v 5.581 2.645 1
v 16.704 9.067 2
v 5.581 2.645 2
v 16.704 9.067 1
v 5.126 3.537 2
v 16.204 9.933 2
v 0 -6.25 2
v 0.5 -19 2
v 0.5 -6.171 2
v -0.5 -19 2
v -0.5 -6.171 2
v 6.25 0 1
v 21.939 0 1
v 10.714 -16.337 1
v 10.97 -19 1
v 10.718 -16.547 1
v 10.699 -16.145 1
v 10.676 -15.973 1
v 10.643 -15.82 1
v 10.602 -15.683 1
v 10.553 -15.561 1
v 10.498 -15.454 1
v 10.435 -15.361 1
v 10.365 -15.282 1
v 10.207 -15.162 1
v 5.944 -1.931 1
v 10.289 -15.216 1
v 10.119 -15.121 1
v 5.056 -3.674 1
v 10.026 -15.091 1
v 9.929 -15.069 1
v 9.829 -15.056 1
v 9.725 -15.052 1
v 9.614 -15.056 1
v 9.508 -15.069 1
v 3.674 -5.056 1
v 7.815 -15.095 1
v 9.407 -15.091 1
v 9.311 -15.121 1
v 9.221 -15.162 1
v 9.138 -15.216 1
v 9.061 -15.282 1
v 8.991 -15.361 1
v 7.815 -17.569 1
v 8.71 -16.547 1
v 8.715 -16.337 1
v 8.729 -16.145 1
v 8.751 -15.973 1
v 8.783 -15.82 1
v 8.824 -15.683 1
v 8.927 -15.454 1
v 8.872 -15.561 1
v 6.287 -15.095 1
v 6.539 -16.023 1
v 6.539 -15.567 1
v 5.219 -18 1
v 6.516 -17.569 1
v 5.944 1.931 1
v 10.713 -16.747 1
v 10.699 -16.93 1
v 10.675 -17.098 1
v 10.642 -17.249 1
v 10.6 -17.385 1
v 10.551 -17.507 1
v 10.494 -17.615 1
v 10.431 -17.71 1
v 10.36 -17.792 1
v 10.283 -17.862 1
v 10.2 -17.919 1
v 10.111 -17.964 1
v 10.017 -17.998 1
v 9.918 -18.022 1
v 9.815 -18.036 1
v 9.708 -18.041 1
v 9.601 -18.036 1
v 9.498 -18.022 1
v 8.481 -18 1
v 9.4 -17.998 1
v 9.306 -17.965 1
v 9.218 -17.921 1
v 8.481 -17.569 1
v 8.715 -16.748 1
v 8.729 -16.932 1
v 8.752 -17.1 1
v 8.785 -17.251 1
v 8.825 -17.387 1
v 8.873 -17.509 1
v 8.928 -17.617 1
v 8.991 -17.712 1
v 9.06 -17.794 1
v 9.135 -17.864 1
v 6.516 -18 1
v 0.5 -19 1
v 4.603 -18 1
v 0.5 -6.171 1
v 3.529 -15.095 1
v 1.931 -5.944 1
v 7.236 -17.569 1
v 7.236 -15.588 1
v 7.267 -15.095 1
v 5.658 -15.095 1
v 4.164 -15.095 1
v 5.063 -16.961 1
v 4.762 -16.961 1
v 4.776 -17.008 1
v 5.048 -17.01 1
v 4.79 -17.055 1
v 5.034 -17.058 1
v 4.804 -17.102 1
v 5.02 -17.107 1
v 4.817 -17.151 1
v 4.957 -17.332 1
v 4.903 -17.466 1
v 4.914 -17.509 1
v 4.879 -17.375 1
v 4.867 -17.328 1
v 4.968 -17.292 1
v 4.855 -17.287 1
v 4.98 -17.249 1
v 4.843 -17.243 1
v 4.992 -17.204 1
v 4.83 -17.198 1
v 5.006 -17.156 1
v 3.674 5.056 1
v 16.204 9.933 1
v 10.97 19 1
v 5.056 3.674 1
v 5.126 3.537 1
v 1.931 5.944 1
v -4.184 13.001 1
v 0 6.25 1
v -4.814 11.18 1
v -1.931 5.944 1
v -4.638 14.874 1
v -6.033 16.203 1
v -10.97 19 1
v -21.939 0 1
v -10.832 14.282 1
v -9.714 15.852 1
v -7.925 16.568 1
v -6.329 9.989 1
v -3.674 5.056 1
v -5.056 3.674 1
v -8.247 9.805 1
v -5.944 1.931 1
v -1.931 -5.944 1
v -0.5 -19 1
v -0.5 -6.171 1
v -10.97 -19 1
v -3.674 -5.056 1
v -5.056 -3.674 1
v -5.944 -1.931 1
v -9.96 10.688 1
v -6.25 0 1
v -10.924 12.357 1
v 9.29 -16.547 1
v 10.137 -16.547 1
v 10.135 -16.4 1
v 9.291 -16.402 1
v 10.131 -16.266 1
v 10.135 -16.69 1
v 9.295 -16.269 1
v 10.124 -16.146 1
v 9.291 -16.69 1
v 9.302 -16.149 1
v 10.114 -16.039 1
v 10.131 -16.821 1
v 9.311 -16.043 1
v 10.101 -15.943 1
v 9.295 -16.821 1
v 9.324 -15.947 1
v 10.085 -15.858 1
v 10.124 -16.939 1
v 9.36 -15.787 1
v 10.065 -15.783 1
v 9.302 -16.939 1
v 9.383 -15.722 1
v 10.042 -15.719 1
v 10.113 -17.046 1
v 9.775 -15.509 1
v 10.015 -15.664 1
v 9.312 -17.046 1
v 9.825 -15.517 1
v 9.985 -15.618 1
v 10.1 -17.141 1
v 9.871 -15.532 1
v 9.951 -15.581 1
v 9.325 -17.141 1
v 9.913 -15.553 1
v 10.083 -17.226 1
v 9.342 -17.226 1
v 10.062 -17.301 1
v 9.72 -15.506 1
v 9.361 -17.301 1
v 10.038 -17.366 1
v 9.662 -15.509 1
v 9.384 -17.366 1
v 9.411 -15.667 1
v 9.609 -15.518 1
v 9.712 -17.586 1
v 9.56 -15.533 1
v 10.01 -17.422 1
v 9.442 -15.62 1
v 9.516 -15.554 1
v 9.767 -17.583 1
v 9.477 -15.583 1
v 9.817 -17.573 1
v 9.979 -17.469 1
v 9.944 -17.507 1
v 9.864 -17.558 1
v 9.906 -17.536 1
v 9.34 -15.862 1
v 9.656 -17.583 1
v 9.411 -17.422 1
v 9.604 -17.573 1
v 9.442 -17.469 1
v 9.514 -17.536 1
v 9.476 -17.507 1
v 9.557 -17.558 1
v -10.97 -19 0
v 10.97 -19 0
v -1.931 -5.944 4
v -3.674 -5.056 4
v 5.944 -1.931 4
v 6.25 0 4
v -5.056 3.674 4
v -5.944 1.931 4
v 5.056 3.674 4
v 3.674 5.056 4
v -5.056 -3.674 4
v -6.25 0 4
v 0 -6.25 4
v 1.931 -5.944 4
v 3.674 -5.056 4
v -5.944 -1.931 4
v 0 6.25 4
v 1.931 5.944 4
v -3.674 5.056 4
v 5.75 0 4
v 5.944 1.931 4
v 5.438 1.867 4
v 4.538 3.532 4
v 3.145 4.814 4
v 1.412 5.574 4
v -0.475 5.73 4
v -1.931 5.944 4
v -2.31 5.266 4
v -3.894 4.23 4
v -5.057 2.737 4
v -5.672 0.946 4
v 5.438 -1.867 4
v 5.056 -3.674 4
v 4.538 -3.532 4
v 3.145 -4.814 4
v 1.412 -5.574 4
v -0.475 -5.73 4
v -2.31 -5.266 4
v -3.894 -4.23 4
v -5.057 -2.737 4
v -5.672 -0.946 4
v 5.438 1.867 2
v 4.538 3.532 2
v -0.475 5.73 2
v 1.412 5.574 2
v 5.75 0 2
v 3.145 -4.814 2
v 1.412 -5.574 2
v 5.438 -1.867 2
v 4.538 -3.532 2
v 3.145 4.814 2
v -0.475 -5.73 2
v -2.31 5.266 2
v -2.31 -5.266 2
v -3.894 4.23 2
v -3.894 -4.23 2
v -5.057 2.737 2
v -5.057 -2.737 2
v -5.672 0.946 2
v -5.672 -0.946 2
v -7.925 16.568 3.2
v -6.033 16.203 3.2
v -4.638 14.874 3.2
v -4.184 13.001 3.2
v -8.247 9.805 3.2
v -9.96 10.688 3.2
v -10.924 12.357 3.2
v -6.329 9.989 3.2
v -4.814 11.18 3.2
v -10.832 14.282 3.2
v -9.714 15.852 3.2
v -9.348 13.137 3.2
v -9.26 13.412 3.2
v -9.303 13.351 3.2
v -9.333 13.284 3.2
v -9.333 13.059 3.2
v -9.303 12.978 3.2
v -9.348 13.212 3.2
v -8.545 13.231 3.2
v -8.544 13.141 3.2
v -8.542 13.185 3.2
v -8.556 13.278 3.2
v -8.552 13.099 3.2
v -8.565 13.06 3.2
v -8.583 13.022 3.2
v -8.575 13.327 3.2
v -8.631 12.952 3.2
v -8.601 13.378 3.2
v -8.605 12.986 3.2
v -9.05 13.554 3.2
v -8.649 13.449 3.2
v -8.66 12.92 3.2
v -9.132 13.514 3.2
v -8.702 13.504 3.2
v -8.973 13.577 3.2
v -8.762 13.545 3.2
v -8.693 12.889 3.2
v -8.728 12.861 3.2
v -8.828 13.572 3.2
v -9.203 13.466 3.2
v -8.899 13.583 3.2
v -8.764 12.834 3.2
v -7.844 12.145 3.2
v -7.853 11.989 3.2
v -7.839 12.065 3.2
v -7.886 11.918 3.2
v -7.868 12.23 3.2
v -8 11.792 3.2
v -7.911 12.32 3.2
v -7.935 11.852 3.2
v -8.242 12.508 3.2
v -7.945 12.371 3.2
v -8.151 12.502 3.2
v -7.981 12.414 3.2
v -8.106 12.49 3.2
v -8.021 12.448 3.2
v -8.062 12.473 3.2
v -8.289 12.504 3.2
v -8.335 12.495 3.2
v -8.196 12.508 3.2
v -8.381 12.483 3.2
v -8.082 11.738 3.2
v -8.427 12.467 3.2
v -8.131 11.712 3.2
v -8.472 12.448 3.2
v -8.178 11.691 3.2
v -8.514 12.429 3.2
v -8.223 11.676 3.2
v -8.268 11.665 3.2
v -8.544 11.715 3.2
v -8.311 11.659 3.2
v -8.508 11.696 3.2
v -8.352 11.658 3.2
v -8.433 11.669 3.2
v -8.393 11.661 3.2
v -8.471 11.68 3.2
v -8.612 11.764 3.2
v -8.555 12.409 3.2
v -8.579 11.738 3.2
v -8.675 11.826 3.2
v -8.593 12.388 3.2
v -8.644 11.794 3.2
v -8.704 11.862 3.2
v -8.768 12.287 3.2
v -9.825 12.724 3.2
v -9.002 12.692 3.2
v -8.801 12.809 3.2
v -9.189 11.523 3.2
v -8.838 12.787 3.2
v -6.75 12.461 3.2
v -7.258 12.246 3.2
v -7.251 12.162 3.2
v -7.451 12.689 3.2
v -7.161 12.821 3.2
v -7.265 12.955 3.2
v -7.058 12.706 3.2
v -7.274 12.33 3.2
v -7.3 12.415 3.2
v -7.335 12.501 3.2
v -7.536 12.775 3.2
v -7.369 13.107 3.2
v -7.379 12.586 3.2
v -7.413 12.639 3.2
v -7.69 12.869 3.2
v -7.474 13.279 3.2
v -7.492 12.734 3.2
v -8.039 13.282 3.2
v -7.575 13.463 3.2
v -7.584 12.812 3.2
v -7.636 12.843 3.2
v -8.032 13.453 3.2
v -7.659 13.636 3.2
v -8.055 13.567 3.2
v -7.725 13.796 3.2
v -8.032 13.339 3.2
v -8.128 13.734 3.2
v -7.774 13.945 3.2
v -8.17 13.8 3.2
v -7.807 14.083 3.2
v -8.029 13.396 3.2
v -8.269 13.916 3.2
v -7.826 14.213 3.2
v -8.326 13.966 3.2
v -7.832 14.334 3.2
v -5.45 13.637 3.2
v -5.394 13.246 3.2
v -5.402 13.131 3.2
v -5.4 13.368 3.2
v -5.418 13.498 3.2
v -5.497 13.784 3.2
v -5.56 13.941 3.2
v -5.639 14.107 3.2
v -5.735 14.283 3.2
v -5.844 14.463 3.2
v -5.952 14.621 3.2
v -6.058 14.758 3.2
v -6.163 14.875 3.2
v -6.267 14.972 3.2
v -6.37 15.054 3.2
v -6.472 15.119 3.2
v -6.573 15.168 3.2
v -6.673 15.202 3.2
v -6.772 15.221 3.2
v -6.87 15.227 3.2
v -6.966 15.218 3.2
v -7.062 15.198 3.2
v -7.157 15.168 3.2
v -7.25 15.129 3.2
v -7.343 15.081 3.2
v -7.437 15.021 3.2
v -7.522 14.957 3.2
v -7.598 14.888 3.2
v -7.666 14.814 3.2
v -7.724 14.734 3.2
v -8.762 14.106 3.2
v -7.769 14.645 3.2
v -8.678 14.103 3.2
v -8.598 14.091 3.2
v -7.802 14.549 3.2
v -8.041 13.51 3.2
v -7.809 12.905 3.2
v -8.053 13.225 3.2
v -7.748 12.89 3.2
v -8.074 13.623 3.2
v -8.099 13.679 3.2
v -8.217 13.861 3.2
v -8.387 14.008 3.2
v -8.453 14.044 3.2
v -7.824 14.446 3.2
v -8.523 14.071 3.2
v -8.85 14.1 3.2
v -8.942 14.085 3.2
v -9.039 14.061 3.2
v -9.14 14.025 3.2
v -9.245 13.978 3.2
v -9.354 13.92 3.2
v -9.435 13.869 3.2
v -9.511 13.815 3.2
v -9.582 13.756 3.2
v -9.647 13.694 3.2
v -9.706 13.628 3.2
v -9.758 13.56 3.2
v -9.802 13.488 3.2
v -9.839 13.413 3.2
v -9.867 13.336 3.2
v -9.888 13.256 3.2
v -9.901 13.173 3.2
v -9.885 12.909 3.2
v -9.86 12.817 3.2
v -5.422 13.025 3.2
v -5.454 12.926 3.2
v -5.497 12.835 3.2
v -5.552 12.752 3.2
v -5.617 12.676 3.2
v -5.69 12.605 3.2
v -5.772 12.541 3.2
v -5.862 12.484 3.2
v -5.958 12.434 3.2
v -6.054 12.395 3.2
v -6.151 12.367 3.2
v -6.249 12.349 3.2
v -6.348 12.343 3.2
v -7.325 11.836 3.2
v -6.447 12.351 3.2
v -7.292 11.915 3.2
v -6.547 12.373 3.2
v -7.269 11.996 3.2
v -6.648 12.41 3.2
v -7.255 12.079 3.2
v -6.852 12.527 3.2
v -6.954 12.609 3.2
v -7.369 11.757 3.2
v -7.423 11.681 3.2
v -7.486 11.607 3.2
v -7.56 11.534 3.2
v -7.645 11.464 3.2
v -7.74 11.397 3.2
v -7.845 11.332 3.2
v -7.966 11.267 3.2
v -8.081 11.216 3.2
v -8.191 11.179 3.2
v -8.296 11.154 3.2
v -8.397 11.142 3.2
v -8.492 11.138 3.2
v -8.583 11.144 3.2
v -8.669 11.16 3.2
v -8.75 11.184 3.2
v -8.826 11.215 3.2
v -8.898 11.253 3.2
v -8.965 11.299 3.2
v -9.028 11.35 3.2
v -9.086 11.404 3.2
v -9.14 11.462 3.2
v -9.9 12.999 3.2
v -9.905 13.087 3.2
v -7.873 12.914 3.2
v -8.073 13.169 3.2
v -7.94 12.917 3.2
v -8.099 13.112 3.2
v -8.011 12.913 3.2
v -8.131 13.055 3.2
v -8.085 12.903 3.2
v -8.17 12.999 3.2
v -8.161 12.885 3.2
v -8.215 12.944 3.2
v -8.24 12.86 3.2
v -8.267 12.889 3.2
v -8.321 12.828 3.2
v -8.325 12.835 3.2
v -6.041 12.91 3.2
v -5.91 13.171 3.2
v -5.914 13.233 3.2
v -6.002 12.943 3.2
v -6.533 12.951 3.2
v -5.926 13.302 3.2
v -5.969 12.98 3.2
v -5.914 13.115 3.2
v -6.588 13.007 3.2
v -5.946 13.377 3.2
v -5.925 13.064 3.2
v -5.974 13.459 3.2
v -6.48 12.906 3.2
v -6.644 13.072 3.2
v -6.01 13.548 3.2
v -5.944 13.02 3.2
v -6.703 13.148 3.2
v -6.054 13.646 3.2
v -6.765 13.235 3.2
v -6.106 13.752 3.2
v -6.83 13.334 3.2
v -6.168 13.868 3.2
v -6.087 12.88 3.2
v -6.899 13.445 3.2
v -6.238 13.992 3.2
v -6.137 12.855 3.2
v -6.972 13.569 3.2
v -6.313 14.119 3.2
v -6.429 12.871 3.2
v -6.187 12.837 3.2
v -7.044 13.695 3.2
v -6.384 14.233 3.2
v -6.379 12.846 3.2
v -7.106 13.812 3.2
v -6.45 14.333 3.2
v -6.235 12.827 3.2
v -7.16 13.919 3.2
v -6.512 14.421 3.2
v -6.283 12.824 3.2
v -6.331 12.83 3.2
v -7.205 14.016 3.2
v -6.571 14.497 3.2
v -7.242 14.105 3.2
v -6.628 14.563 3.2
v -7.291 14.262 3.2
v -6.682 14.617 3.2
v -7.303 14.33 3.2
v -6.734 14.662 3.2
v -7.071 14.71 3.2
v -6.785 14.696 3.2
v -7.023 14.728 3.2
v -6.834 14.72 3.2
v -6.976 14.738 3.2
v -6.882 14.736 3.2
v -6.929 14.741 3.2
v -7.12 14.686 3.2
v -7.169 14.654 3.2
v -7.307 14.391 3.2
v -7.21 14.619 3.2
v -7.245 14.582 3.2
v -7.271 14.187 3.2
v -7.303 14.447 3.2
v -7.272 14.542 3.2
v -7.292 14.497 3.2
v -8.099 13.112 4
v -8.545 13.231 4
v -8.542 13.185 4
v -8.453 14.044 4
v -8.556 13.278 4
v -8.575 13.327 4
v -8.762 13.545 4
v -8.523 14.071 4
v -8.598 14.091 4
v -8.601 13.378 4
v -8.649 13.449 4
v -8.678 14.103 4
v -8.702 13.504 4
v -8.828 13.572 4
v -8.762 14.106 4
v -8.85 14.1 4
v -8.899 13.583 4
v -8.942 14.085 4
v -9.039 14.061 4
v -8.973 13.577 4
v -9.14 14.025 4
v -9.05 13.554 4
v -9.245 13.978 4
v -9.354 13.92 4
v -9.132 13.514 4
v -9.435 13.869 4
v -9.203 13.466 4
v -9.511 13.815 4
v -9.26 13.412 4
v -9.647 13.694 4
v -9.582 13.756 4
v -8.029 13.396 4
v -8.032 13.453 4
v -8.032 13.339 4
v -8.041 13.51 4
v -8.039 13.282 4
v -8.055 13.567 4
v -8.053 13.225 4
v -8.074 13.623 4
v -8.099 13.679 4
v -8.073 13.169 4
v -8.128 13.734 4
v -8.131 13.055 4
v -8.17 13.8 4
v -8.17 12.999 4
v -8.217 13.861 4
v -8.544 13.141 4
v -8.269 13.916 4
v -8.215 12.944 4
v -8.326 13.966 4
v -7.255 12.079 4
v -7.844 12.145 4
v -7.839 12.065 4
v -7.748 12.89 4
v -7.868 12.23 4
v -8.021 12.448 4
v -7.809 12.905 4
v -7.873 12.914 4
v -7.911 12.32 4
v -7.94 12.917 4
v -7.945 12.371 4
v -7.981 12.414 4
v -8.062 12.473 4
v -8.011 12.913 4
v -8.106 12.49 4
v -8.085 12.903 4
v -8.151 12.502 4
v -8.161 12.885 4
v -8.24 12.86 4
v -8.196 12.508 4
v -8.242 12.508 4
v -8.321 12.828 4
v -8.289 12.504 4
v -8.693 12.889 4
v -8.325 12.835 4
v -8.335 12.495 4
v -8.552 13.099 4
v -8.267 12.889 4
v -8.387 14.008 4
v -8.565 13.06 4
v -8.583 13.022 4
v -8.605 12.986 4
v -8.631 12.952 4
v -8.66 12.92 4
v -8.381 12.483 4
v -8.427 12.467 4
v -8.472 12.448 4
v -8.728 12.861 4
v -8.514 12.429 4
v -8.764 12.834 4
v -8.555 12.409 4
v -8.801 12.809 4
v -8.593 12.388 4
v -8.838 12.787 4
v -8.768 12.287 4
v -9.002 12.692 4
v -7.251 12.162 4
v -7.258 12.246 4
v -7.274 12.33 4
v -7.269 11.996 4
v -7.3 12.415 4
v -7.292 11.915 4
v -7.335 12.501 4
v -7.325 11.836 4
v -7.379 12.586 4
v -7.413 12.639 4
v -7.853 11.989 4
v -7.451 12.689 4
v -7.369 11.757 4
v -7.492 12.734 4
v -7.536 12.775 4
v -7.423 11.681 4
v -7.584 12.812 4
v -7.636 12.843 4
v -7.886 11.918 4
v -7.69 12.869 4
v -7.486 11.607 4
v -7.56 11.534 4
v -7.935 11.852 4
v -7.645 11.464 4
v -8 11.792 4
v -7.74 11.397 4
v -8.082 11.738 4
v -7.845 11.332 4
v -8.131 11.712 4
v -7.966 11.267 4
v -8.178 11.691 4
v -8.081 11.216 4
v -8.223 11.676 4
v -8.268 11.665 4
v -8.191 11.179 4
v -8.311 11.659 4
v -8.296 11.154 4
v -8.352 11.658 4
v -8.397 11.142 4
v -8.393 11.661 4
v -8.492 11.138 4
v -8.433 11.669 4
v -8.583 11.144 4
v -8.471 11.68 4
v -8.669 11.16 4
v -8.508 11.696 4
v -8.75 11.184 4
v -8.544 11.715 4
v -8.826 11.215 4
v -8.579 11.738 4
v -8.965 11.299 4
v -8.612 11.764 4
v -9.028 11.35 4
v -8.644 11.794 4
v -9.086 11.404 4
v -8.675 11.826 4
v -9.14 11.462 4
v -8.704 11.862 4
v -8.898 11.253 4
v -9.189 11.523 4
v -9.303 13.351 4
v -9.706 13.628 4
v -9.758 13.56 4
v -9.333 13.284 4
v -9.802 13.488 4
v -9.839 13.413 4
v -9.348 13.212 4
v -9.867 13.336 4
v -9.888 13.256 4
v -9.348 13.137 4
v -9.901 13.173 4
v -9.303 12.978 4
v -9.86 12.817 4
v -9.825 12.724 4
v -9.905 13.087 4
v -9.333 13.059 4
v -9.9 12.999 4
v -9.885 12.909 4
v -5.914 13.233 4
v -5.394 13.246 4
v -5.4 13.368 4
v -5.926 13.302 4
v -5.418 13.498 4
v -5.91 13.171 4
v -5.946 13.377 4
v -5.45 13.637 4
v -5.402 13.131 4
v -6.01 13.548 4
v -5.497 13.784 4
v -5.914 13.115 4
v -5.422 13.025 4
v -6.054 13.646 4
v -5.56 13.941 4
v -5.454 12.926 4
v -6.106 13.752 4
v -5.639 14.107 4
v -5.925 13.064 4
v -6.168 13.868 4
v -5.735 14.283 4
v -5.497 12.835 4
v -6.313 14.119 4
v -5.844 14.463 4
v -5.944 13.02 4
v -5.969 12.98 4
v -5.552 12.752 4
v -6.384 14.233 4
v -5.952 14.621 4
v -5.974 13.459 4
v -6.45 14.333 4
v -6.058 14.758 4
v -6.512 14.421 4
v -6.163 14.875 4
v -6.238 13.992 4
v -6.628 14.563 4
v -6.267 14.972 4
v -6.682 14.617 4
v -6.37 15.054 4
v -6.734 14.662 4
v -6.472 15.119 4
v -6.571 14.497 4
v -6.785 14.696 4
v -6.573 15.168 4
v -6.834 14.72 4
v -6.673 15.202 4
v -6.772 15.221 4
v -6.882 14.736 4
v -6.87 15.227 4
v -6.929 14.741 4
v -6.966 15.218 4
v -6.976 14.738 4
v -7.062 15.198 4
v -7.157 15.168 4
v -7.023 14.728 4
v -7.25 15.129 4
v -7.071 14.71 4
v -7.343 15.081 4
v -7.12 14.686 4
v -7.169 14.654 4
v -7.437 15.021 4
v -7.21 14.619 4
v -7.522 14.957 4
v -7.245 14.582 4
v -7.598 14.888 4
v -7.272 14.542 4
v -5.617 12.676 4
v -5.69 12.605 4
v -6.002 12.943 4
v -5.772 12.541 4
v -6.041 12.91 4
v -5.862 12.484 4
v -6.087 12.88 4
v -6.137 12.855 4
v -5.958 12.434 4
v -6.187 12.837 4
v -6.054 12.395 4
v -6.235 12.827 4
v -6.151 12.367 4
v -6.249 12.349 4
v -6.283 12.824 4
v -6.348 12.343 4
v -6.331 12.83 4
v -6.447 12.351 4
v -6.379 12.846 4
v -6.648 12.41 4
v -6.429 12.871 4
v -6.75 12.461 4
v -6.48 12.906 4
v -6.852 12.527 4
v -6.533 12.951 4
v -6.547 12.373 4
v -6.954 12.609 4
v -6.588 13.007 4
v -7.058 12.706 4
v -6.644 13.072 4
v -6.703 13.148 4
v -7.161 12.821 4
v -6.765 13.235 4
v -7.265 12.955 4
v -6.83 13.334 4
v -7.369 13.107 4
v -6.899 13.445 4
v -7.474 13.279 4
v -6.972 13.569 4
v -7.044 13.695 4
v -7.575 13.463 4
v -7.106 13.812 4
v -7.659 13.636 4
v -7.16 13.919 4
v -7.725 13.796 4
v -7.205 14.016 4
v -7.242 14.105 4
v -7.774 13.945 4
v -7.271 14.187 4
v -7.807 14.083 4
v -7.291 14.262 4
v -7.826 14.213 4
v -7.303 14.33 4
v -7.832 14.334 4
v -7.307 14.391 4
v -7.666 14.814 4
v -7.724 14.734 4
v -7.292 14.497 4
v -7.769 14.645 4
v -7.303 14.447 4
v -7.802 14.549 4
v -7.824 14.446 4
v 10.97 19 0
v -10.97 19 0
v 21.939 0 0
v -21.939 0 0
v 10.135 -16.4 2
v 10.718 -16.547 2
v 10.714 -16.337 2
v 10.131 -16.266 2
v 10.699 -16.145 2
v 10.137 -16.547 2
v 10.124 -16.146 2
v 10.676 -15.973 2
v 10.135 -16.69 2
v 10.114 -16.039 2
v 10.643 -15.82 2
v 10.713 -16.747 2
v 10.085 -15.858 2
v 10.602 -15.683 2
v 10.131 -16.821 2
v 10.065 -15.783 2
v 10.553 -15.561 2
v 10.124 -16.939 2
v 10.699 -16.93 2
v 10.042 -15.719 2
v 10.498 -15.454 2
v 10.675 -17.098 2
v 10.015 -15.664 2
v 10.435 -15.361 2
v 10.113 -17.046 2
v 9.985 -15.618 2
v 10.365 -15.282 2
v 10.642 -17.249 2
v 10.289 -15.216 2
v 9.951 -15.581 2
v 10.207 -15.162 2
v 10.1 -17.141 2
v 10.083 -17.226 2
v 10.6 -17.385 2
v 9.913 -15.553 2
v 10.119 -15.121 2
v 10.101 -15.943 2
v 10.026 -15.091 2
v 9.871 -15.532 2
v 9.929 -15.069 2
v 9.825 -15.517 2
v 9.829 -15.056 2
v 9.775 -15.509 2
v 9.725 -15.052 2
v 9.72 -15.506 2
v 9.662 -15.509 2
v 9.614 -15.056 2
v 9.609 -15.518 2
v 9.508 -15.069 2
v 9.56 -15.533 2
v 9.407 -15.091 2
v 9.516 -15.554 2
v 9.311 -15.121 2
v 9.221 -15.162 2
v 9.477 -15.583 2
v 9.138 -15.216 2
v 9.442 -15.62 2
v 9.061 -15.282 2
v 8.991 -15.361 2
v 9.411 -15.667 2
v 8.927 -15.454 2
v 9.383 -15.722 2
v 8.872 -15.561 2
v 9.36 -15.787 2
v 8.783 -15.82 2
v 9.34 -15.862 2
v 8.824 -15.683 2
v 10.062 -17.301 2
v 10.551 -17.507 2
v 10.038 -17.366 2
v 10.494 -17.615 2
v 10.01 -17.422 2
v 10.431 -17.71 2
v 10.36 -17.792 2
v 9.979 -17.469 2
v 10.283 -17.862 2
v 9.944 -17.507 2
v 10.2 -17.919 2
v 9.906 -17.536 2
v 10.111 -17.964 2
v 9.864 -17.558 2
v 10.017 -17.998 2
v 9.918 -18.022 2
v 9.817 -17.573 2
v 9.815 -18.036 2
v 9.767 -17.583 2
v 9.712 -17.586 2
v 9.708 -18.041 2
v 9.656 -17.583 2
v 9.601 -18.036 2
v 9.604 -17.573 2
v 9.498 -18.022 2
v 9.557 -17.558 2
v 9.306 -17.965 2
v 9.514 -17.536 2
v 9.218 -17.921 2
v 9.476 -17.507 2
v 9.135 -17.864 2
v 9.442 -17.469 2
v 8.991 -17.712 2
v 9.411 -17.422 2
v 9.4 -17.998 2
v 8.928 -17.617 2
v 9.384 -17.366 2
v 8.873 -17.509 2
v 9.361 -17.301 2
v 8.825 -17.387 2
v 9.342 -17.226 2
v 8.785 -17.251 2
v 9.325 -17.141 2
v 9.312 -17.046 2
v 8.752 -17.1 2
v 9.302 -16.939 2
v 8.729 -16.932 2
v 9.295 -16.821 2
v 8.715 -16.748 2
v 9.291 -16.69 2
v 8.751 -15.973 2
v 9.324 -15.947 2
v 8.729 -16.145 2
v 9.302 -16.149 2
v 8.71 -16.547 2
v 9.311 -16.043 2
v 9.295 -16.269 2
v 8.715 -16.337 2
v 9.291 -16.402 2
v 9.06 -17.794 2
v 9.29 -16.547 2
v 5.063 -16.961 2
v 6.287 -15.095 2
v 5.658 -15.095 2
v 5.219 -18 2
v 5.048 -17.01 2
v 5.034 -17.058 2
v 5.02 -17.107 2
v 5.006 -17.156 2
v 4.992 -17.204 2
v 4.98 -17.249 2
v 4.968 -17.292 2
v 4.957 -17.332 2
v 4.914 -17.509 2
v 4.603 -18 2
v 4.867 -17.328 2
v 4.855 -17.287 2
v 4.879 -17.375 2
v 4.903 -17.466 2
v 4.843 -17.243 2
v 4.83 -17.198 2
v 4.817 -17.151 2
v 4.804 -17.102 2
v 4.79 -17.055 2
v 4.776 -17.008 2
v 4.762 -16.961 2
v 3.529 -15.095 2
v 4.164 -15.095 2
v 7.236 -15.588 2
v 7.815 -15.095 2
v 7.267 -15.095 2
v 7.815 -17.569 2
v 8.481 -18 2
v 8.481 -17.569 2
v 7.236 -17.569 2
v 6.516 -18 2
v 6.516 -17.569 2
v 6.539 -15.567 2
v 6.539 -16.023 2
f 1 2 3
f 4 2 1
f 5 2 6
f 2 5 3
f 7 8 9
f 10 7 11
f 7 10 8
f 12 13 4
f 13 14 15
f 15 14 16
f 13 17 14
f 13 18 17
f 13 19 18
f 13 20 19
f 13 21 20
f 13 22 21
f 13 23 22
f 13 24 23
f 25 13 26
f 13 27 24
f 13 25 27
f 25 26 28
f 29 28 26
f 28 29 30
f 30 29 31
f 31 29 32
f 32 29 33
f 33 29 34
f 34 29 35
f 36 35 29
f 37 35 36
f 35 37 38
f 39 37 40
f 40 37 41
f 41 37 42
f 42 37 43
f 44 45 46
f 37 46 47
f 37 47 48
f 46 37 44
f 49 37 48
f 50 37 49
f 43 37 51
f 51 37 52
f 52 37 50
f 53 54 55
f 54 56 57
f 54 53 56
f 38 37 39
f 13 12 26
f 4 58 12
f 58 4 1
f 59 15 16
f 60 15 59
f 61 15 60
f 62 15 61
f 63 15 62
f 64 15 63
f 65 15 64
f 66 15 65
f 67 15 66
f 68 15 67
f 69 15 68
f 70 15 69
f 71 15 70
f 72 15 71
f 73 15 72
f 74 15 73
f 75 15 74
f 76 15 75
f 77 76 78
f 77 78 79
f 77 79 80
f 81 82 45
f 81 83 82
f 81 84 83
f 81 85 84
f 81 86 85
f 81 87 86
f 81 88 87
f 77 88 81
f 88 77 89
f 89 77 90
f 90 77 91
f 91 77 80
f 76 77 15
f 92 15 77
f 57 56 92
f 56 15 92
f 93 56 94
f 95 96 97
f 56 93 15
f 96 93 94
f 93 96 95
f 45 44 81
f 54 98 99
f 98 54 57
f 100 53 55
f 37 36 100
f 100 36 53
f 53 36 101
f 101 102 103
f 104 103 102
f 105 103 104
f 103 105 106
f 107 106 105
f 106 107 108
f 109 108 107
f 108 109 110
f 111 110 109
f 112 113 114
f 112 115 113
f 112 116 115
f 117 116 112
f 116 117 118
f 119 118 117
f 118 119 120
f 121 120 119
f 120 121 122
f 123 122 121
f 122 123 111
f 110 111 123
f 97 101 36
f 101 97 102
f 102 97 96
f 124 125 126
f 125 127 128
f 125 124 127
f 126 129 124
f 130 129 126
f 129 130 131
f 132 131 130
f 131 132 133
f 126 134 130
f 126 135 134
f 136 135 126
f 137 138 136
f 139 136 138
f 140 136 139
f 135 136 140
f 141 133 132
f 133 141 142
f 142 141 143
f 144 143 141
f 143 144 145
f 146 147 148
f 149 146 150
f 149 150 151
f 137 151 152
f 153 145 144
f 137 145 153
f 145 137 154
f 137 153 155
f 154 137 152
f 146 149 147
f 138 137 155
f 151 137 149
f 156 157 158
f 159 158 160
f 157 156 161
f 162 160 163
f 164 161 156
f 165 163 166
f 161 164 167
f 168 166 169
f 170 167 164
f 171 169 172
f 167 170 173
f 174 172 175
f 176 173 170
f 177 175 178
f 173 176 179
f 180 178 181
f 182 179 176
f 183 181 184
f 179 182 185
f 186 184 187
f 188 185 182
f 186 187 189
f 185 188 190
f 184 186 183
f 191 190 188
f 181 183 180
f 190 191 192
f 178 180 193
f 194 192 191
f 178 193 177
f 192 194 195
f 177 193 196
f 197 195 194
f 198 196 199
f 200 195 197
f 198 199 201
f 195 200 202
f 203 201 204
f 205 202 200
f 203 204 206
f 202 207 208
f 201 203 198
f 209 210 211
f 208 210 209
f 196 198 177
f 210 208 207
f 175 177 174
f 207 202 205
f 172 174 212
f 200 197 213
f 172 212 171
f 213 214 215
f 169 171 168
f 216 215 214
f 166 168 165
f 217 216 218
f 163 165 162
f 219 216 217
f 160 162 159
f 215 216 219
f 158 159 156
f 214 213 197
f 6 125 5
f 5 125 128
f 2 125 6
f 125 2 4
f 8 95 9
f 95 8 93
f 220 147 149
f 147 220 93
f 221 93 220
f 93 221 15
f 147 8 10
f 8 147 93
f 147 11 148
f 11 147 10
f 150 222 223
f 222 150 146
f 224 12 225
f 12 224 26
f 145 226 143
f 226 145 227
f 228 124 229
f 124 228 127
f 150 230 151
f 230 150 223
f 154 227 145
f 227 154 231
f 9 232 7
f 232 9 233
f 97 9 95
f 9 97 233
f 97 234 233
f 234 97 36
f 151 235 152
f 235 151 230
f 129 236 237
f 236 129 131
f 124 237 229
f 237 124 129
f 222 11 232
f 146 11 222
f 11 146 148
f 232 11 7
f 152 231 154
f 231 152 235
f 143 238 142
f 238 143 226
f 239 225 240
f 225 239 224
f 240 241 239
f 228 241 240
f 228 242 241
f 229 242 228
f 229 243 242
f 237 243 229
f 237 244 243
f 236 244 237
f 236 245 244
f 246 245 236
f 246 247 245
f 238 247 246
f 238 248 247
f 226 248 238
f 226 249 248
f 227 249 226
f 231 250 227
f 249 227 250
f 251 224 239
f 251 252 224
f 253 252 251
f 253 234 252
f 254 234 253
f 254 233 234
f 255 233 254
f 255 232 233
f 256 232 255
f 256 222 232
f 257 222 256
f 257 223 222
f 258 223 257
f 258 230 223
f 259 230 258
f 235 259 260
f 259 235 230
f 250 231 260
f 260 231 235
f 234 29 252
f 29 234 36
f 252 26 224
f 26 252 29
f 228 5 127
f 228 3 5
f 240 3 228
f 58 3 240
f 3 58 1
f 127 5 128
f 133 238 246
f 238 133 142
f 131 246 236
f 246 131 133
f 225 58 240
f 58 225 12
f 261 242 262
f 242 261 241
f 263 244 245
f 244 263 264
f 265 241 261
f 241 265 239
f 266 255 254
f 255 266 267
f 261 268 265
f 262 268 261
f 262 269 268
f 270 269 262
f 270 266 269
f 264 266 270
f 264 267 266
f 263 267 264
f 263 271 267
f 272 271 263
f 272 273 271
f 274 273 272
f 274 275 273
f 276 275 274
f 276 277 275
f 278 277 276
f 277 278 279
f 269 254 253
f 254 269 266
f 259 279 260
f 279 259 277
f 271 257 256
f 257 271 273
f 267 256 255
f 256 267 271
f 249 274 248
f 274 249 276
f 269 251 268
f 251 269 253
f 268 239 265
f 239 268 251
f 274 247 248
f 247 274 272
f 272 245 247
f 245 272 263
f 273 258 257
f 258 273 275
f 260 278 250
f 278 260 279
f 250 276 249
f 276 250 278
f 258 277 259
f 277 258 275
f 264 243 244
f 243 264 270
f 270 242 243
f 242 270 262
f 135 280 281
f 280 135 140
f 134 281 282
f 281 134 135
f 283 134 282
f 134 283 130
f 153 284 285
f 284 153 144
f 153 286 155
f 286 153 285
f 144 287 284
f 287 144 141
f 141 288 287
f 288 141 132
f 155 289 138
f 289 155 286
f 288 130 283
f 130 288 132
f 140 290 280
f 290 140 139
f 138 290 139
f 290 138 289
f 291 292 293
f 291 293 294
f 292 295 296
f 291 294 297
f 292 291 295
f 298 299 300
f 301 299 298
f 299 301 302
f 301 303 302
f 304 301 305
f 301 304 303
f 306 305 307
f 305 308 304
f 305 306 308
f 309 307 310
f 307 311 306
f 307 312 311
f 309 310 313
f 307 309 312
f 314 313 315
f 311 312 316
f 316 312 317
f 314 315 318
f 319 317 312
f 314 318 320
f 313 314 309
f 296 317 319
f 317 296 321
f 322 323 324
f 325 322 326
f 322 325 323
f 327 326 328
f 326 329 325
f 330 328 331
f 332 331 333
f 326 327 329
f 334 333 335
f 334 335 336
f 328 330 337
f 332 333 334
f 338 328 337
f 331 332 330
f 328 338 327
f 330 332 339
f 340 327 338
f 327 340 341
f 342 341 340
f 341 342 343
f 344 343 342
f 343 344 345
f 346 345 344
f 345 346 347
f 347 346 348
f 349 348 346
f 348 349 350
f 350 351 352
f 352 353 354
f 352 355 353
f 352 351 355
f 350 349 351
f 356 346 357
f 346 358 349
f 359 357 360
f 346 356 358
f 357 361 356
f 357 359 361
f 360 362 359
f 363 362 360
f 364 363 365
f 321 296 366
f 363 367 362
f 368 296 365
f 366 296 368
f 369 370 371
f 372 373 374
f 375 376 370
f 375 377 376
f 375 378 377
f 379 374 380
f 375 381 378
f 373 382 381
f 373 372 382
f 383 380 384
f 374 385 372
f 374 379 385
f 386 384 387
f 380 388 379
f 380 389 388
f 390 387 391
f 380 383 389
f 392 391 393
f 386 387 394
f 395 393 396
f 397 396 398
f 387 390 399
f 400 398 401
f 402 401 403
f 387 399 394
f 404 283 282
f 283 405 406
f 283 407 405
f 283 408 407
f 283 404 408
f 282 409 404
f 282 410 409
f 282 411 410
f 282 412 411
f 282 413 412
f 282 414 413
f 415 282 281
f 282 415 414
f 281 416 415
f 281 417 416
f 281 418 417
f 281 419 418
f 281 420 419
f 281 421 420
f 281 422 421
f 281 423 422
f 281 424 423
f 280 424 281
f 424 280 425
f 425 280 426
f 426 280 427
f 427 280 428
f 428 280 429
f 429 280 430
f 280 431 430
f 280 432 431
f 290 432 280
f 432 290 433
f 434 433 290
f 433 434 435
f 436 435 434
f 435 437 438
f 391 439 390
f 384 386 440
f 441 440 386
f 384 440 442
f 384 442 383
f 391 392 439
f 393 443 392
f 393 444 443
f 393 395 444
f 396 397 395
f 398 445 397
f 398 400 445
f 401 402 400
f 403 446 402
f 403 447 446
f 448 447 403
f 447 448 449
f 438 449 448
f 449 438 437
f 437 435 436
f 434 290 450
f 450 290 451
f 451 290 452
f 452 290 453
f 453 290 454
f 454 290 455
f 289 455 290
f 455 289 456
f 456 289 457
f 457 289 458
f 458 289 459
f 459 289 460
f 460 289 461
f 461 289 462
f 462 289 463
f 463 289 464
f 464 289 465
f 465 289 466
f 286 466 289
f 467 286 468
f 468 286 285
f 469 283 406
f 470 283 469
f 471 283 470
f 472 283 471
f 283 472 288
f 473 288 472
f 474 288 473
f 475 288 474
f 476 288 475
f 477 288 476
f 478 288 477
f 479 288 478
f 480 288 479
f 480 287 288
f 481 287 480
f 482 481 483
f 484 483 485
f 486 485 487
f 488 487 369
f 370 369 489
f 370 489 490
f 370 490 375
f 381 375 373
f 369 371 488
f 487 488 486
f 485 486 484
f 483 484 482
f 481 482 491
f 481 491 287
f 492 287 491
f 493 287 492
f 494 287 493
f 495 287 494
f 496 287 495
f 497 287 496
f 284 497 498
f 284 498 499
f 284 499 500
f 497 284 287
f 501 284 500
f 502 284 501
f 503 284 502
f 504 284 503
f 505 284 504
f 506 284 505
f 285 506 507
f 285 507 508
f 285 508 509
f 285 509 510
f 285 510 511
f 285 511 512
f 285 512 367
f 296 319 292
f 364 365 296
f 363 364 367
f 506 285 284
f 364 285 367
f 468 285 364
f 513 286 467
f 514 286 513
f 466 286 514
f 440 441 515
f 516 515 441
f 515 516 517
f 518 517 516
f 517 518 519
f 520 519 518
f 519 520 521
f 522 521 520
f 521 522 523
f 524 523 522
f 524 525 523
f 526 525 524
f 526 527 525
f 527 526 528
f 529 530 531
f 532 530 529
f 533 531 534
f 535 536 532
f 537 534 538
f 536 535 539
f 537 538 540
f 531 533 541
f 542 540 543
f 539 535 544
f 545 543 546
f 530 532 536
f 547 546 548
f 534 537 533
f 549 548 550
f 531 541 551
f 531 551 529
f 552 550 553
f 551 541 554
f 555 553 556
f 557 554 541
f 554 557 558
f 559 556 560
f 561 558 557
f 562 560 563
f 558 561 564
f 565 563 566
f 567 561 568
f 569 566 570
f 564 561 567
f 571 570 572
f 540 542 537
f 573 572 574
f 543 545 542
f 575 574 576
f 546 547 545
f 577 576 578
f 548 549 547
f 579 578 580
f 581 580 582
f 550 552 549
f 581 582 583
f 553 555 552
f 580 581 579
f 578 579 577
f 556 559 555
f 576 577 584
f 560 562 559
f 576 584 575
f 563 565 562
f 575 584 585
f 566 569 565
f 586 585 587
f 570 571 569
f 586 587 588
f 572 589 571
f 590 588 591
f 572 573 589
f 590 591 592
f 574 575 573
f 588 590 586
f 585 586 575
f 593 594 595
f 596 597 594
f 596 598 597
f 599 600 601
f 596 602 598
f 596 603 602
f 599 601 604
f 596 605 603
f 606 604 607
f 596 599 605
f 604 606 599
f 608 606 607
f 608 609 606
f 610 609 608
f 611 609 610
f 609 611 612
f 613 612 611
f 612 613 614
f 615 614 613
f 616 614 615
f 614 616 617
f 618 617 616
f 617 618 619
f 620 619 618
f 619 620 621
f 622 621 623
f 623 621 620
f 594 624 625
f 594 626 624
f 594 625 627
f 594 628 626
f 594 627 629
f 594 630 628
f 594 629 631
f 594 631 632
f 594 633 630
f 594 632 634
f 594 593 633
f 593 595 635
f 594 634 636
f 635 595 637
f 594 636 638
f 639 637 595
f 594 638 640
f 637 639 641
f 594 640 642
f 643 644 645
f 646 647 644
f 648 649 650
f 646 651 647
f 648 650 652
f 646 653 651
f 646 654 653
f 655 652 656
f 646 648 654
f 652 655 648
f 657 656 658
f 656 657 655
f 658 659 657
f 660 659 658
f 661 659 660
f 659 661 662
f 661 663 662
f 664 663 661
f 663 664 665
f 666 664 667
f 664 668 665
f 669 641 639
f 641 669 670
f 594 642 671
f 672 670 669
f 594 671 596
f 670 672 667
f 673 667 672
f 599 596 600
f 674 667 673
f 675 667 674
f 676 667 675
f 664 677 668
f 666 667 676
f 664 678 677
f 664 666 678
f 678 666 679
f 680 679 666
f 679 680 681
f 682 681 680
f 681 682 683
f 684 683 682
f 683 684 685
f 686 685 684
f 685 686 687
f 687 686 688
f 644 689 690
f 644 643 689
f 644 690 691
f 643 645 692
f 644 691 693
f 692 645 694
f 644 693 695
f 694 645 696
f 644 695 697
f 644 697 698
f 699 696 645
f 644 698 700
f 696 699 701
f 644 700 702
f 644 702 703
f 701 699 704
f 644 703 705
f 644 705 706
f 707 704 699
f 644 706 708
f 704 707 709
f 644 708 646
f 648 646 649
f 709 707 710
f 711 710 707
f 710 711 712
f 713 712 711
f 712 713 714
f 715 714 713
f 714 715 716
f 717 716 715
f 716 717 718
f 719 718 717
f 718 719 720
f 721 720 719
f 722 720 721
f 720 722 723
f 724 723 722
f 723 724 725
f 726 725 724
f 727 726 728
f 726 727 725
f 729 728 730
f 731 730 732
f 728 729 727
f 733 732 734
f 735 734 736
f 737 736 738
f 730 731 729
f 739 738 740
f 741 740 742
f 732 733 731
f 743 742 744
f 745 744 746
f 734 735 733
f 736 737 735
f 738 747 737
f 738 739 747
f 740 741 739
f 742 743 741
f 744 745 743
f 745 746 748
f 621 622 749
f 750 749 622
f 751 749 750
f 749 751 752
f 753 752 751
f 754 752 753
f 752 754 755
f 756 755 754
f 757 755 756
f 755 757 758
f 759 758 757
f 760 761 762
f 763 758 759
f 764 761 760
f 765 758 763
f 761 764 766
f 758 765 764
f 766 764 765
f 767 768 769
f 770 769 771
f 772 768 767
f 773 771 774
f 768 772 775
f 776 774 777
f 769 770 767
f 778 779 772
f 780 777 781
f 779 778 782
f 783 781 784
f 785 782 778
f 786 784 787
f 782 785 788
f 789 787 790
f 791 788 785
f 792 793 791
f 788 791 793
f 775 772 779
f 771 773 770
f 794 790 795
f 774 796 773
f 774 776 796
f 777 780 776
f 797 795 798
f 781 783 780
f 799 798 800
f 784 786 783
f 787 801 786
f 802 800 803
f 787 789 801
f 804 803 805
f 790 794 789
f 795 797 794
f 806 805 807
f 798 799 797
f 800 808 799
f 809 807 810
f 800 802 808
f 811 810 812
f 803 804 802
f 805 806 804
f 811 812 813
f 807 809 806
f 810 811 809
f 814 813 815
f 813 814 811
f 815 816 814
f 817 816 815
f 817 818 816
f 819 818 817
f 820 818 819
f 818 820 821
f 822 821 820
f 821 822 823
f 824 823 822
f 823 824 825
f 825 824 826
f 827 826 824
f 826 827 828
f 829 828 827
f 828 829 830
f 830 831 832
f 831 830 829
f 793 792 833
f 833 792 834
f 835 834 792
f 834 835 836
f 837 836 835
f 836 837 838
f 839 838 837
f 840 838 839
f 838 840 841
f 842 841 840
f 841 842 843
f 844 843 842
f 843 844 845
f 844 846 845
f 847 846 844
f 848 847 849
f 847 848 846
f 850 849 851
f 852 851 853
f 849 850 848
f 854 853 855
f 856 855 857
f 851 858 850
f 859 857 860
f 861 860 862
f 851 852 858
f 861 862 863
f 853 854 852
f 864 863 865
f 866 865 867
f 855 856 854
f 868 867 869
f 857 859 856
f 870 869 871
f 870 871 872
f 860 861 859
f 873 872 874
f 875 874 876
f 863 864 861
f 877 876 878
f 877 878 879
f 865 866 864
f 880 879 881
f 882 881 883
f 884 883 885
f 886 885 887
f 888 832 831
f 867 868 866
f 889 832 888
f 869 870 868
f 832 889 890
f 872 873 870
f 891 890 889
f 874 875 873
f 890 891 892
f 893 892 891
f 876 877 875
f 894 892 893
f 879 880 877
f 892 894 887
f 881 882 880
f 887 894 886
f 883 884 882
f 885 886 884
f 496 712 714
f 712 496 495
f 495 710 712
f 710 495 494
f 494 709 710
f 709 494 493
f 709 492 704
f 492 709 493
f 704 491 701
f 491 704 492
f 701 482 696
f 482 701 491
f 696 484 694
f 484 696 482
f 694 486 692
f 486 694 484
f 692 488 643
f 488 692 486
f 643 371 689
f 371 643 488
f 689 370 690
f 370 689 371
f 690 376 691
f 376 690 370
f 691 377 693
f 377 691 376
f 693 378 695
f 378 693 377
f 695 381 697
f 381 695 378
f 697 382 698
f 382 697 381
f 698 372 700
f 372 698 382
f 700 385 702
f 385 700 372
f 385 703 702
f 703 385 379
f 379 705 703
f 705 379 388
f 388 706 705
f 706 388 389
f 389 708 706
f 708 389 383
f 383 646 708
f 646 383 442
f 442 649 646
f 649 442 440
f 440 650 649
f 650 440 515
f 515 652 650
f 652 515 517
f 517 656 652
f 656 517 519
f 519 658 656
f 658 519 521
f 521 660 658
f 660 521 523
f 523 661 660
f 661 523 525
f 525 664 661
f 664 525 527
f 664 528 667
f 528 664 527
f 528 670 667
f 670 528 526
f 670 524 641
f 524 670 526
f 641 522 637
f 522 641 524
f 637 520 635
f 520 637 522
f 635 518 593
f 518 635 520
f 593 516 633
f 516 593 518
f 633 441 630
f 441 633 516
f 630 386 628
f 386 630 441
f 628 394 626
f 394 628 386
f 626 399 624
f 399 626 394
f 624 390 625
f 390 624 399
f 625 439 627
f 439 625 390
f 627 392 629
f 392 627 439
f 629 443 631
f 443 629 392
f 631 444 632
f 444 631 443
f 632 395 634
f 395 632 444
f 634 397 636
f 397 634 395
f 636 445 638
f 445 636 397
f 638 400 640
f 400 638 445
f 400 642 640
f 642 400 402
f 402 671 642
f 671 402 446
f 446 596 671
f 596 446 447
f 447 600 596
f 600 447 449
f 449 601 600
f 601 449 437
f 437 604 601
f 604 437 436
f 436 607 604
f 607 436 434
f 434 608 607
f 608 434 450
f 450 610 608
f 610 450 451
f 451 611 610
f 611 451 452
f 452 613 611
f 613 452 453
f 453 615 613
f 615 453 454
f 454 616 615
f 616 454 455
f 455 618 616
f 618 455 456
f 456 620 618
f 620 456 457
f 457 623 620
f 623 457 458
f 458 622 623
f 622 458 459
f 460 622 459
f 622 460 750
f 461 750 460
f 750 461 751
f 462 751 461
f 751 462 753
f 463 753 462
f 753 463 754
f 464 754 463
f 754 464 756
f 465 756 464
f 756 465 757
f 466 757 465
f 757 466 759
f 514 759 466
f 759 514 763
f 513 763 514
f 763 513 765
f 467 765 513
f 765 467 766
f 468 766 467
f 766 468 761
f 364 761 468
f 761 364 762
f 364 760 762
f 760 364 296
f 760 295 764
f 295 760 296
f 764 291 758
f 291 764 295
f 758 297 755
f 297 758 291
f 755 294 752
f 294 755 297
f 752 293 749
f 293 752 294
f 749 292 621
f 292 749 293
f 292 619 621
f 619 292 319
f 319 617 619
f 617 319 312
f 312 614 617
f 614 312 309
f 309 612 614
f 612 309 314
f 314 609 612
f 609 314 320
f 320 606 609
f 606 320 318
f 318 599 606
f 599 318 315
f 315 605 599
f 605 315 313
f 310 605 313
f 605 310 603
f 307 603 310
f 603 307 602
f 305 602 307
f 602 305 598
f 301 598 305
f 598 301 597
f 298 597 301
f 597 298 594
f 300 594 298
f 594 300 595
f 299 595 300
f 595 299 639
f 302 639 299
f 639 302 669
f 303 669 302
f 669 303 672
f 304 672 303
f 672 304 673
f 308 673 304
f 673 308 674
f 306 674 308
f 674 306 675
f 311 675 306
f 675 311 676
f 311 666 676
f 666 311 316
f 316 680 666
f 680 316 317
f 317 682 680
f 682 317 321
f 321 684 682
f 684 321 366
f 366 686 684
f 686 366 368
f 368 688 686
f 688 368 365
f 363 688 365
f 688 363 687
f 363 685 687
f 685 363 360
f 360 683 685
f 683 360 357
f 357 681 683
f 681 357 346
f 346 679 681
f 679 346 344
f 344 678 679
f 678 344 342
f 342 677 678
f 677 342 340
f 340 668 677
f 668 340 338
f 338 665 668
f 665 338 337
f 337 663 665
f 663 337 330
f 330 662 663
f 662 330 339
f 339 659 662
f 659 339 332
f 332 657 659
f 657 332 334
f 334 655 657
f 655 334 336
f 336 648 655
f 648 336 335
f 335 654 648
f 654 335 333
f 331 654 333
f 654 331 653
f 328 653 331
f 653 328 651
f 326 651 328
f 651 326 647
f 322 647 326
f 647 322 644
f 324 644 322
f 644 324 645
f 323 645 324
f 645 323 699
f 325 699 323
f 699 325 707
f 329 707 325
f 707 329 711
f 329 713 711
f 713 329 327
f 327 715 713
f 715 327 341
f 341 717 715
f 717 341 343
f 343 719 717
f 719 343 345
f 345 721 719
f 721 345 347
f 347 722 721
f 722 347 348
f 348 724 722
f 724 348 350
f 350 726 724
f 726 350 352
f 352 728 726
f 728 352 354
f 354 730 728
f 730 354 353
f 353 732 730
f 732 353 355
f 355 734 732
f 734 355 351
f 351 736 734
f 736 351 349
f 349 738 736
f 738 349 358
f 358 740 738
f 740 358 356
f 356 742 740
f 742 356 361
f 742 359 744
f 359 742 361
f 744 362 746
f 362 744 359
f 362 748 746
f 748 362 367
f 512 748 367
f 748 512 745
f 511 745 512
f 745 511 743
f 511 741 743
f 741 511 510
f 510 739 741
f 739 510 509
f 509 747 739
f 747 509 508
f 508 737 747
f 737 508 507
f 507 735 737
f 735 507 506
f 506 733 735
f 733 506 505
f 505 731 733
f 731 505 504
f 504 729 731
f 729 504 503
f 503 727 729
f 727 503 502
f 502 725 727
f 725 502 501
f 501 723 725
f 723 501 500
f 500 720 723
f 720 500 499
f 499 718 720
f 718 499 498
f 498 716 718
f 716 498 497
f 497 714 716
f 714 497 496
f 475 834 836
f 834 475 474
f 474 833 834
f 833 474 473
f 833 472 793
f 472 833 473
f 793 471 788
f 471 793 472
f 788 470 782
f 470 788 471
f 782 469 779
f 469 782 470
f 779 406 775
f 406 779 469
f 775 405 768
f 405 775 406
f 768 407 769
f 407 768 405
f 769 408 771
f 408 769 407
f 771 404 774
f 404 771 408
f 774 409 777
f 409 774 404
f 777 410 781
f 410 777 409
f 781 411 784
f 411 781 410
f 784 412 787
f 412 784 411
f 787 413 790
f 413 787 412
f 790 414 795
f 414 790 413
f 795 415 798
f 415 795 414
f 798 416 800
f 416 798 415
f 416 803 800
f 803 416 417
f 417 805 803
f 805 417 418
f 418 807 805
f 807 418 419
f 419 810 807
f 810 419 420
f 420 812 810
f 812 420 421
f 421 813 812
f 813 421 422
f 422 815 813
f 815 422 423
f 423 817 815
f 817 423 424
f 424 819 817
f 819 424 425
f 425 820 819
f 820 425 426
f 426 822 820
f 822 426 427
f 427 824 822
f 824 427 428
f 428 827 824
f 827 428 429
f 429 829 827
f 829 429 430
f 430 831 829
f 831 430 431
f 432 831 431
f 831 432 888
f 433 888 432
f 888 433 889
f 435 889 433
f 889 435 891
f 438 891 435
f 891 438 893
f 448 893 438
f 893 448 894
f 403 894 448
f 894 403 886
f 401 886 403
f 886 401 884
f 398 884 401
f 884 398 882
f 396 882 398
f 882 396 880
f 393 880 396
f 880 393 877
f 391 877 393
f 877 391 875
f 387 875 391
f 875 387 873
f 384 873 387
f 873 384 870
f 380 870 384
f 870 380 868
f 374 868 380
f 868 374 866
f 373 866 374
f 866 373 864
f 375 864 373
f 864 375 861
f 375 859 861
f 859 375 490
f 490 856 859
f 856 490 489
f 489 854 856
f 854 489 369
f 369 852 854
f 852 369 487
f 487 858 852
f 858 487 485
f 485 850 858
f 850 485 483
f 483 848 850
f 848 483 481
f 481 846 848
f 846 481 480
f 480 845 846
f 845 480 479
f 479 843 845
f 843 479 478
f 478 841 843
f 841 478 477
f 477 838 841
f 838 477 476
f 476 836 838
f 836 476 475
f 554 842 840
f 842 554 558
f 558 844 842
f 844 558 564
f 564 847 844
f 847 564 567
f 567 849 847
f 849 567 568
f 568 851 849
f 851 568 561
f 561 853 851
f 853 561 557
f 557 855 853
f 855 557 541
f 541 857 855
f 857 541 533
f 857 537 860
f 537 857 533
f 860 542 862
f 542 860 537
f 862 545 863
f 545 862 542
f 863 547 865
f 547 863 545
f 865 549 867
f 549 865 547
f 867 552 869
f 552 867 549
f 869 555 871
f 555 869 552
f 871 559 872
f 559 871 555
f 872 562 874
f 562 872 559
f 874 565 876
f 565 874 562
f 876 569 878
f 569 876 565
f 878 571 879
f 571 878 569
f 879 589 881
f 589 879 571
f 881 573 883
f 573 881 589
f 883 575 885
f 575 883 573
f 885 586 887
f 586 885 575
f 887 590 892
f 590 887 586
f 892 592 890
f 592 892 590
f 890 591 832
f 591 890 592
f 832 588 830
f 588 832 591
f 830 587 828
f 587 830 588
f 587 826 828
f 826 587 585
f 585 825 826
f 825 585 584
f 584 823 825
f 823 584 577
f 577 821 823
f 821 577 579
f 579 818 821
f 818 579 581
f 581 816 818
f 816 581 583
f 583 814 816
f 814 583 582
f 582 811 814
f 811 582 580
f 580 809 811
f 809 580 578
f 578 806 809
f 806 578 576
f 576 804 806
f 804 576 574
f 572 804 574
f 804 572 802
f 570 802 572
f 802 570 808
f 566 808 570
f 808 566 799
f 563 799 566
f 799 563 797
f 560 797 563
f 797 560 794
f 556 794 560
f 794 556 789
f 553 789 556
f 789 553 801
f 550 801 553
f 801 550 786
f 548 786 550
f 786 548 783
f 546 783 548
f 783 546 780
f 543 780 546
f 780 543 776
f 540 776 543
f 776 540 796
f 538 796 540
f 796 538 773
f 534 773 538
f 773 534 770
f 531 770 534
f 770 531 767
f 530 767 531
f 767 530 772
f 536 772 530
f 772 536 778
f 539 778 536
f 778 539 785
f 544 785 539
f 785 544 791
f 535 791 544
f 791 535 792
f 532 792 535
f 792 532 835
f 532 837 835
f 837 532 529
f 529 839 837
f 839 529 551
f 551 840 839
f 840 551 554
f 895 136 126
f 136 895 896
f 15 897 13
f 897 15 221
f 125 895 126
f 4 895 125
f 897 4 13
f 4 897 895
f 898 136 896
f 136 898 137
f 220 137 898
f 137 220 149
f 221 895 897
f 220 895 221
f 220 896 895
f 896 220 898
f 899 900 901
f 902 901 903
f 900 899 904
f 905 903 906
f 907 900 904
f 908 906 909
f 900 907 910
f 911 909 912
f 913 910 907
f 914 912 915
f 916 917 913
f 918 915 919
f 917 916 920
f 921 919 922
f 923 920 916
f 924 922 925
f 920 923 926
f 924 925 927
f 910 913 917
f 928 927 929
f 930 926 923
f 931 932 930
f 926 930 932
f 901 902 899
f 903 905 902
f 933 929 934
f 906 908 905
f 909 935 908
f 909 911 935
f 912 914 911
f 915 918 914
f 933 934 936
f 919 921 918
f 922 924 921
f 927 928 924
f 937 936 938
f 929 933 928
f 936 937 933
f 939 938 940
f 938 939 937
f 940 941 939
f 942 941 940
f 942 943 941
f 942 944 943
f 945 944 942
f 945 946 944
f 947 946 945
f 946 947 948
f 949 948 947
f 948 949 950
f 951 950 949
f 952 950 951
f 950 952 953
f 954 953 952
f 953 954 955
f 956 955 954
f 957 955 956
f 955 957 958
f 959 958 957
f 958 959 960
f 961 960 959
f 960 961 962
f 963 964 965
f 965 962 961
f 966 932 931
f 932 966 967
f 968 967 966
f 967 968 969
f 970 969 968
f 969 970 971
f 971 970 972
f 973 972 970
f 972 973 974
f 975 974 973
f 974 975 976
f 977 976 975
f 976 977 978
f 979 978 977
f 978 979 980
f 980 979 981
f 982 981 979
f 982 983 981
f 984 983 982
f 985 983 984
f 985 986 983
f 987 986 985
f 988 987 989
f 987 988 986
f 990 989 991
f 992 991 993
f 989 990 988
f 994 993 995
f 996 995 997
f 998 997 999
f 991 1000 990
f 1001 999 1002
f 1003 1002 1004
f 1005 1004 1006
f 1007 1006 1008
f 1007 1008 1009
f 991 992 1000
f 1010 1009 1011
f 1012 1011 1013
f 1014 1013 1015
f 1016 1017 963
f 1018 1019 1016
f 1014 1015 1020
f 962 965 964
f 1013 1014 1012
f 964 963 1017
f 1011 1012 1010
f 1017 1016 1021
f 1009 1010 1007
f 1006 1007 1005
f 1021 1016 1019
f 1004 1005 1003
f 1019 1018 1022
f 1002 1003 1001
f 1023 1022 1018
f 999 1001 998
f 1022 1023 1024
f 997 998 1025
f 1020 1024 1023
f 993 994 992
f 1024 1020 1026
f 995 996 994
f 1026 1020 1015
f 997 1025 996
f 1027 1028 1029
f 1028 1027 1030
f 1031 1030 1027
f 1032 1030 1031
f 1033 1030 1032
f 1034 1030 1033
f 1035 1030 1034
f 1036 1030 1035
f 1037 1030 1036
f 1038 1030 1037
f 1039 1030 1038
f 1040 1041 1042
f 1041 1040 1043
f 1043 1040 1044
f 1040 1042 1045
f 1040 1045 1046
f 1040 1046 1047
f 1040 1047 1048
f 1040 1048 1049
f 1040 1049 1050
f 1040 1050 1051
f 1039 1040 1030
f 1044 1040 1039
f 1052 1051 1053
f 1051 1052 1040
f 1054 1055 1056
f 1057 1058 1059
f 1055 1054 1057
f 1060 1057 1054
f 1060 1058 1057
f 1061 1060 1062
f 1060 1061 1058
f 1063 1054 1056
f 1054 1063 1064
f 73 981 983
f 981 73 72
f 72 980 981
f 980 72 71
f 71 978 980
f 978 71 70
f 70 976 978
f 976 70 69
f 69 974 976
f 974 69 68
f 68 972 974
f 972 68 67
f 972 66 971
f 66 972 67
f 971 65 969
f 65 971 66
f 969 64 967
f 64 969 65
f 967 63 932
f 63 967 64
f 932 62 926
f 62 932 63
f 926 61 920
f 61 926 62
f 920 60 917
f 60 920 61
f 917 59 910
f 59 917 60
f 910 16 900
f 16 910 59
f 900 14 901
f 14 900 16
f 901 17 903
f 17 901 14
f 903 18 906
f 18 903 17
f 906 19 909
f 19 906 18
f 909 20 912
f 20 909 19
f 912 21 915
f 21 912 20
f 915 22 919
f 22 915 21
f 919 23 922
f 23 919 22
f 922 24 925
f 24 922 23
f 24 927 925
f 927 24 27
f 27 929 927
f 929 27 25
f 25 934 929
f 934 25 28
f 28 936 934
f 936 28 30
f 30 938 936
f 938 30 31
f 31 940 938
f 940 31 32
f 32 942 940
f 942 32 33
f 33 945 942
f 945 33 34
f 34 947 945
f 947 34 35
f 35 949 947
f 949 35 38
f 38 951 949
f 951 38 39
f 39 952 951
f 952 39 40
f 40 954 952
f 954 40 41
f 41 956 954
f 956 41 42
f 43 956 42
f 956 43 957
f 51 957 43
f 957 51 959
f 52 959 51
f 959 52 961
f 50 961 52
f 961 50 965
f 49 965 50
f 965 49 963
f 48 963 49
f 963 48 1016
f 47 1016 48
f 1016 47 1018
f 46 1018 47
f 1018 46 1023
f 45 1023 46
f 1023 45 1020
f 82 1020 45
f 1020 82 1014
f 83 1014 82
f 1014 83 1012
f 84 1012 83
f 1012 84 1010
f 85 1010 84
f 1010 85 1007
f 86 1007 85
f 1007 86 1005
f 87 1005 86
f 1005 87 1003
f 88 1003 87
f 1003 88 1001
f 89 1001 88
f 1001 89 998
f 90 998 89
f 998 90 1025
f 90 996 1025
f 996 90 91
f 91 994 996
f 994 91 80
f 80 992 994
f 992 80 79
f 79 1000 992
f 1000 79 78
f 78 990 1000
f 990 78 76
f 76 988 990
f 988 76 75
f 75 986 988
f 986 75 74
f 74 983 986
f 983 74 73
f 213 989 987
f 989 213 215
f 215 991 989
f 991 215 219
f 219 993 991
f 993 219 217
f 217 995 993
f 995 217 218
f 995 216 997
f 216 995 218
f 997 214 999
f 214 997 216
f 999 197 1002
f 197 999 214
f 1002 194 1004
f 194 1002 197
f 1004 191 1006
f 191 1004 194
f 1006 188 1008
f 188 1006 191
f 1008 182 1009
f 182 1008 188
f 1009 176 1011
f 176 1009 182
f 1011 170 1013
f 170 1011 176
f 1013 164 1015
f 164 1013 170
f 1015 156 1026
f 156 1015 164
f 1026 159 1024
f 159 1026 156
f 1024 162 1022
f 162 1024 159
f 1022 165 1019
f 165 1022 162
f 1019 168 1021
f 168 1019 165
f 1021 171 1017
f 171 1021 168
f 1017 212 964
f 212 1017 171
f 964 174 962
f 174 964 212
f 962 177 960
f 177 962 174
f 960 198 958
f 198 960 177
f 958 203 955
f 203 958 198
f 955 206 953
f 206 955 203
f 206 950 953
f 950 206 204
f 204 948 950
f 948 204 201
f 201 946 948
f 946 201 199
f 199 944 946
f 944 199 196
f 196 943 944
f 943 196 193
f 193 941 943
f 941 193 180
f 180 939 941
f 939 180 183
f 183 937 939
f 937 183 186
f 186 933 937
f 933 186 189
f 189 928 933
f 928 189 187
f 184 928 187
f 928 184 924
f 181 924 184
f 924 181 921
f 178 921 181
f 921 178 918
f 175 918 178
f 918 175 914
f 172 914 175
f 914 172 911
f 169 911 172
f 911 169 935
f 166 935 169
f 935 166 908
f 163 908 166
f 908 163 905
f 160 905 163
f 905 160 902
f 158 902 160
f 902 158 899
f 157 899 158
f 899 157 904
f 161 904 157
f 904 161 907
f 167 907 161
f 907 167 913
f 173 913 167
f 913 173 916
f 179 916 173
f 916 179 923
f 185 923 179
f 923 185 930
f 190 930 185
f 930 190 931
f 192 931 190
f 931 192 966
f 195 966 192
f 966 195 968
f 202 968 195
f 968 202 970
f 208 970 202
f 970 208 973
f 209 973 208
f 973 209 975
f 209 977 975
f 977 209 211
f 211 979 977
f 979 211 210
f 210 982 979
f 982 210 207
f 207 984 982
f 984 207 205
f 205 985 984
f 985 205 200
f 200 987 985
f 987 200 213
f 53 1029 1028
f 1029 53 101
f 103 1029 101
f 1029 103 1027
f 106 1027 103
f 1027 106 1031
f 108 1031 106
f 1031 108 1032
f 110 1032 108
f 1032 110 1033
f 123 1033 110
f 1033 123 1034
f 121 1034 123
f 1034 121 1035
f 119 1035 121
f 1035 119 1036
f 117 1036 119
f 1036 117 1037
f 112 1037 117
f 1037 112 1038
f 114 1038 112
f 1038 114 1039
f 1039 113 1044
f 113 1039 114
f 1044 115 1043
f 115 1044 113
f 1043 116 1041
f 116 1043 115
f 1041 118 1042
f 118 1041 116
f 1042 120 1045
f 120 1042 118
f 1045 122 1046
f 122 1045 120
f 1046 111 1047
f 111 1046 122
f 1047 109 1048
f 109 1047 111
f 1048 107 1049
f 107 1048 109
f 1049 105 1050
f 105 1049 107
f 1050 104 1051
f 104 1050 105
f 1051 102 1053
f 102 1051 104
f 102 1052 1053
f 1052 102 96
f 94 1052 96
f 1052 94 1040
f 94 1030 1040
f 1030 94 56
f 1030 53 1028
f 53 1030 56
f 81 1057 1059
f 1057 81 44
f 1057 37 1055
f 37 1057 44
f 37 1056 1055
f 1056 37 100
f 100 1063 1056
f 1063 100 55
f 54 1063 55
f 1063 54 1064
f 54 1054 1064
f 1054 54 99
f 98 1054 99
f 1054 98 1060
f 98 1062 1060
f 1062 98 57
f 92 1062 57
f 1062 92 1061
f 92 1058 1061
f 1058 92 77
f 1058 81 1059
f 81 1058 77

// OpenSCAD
include <../../Scripts/18xx tiles basic functions.scad>
hex("green");
put_tilenr("V10");
single_city(v=[5, 3]);
put_value_blue("30",-30);
